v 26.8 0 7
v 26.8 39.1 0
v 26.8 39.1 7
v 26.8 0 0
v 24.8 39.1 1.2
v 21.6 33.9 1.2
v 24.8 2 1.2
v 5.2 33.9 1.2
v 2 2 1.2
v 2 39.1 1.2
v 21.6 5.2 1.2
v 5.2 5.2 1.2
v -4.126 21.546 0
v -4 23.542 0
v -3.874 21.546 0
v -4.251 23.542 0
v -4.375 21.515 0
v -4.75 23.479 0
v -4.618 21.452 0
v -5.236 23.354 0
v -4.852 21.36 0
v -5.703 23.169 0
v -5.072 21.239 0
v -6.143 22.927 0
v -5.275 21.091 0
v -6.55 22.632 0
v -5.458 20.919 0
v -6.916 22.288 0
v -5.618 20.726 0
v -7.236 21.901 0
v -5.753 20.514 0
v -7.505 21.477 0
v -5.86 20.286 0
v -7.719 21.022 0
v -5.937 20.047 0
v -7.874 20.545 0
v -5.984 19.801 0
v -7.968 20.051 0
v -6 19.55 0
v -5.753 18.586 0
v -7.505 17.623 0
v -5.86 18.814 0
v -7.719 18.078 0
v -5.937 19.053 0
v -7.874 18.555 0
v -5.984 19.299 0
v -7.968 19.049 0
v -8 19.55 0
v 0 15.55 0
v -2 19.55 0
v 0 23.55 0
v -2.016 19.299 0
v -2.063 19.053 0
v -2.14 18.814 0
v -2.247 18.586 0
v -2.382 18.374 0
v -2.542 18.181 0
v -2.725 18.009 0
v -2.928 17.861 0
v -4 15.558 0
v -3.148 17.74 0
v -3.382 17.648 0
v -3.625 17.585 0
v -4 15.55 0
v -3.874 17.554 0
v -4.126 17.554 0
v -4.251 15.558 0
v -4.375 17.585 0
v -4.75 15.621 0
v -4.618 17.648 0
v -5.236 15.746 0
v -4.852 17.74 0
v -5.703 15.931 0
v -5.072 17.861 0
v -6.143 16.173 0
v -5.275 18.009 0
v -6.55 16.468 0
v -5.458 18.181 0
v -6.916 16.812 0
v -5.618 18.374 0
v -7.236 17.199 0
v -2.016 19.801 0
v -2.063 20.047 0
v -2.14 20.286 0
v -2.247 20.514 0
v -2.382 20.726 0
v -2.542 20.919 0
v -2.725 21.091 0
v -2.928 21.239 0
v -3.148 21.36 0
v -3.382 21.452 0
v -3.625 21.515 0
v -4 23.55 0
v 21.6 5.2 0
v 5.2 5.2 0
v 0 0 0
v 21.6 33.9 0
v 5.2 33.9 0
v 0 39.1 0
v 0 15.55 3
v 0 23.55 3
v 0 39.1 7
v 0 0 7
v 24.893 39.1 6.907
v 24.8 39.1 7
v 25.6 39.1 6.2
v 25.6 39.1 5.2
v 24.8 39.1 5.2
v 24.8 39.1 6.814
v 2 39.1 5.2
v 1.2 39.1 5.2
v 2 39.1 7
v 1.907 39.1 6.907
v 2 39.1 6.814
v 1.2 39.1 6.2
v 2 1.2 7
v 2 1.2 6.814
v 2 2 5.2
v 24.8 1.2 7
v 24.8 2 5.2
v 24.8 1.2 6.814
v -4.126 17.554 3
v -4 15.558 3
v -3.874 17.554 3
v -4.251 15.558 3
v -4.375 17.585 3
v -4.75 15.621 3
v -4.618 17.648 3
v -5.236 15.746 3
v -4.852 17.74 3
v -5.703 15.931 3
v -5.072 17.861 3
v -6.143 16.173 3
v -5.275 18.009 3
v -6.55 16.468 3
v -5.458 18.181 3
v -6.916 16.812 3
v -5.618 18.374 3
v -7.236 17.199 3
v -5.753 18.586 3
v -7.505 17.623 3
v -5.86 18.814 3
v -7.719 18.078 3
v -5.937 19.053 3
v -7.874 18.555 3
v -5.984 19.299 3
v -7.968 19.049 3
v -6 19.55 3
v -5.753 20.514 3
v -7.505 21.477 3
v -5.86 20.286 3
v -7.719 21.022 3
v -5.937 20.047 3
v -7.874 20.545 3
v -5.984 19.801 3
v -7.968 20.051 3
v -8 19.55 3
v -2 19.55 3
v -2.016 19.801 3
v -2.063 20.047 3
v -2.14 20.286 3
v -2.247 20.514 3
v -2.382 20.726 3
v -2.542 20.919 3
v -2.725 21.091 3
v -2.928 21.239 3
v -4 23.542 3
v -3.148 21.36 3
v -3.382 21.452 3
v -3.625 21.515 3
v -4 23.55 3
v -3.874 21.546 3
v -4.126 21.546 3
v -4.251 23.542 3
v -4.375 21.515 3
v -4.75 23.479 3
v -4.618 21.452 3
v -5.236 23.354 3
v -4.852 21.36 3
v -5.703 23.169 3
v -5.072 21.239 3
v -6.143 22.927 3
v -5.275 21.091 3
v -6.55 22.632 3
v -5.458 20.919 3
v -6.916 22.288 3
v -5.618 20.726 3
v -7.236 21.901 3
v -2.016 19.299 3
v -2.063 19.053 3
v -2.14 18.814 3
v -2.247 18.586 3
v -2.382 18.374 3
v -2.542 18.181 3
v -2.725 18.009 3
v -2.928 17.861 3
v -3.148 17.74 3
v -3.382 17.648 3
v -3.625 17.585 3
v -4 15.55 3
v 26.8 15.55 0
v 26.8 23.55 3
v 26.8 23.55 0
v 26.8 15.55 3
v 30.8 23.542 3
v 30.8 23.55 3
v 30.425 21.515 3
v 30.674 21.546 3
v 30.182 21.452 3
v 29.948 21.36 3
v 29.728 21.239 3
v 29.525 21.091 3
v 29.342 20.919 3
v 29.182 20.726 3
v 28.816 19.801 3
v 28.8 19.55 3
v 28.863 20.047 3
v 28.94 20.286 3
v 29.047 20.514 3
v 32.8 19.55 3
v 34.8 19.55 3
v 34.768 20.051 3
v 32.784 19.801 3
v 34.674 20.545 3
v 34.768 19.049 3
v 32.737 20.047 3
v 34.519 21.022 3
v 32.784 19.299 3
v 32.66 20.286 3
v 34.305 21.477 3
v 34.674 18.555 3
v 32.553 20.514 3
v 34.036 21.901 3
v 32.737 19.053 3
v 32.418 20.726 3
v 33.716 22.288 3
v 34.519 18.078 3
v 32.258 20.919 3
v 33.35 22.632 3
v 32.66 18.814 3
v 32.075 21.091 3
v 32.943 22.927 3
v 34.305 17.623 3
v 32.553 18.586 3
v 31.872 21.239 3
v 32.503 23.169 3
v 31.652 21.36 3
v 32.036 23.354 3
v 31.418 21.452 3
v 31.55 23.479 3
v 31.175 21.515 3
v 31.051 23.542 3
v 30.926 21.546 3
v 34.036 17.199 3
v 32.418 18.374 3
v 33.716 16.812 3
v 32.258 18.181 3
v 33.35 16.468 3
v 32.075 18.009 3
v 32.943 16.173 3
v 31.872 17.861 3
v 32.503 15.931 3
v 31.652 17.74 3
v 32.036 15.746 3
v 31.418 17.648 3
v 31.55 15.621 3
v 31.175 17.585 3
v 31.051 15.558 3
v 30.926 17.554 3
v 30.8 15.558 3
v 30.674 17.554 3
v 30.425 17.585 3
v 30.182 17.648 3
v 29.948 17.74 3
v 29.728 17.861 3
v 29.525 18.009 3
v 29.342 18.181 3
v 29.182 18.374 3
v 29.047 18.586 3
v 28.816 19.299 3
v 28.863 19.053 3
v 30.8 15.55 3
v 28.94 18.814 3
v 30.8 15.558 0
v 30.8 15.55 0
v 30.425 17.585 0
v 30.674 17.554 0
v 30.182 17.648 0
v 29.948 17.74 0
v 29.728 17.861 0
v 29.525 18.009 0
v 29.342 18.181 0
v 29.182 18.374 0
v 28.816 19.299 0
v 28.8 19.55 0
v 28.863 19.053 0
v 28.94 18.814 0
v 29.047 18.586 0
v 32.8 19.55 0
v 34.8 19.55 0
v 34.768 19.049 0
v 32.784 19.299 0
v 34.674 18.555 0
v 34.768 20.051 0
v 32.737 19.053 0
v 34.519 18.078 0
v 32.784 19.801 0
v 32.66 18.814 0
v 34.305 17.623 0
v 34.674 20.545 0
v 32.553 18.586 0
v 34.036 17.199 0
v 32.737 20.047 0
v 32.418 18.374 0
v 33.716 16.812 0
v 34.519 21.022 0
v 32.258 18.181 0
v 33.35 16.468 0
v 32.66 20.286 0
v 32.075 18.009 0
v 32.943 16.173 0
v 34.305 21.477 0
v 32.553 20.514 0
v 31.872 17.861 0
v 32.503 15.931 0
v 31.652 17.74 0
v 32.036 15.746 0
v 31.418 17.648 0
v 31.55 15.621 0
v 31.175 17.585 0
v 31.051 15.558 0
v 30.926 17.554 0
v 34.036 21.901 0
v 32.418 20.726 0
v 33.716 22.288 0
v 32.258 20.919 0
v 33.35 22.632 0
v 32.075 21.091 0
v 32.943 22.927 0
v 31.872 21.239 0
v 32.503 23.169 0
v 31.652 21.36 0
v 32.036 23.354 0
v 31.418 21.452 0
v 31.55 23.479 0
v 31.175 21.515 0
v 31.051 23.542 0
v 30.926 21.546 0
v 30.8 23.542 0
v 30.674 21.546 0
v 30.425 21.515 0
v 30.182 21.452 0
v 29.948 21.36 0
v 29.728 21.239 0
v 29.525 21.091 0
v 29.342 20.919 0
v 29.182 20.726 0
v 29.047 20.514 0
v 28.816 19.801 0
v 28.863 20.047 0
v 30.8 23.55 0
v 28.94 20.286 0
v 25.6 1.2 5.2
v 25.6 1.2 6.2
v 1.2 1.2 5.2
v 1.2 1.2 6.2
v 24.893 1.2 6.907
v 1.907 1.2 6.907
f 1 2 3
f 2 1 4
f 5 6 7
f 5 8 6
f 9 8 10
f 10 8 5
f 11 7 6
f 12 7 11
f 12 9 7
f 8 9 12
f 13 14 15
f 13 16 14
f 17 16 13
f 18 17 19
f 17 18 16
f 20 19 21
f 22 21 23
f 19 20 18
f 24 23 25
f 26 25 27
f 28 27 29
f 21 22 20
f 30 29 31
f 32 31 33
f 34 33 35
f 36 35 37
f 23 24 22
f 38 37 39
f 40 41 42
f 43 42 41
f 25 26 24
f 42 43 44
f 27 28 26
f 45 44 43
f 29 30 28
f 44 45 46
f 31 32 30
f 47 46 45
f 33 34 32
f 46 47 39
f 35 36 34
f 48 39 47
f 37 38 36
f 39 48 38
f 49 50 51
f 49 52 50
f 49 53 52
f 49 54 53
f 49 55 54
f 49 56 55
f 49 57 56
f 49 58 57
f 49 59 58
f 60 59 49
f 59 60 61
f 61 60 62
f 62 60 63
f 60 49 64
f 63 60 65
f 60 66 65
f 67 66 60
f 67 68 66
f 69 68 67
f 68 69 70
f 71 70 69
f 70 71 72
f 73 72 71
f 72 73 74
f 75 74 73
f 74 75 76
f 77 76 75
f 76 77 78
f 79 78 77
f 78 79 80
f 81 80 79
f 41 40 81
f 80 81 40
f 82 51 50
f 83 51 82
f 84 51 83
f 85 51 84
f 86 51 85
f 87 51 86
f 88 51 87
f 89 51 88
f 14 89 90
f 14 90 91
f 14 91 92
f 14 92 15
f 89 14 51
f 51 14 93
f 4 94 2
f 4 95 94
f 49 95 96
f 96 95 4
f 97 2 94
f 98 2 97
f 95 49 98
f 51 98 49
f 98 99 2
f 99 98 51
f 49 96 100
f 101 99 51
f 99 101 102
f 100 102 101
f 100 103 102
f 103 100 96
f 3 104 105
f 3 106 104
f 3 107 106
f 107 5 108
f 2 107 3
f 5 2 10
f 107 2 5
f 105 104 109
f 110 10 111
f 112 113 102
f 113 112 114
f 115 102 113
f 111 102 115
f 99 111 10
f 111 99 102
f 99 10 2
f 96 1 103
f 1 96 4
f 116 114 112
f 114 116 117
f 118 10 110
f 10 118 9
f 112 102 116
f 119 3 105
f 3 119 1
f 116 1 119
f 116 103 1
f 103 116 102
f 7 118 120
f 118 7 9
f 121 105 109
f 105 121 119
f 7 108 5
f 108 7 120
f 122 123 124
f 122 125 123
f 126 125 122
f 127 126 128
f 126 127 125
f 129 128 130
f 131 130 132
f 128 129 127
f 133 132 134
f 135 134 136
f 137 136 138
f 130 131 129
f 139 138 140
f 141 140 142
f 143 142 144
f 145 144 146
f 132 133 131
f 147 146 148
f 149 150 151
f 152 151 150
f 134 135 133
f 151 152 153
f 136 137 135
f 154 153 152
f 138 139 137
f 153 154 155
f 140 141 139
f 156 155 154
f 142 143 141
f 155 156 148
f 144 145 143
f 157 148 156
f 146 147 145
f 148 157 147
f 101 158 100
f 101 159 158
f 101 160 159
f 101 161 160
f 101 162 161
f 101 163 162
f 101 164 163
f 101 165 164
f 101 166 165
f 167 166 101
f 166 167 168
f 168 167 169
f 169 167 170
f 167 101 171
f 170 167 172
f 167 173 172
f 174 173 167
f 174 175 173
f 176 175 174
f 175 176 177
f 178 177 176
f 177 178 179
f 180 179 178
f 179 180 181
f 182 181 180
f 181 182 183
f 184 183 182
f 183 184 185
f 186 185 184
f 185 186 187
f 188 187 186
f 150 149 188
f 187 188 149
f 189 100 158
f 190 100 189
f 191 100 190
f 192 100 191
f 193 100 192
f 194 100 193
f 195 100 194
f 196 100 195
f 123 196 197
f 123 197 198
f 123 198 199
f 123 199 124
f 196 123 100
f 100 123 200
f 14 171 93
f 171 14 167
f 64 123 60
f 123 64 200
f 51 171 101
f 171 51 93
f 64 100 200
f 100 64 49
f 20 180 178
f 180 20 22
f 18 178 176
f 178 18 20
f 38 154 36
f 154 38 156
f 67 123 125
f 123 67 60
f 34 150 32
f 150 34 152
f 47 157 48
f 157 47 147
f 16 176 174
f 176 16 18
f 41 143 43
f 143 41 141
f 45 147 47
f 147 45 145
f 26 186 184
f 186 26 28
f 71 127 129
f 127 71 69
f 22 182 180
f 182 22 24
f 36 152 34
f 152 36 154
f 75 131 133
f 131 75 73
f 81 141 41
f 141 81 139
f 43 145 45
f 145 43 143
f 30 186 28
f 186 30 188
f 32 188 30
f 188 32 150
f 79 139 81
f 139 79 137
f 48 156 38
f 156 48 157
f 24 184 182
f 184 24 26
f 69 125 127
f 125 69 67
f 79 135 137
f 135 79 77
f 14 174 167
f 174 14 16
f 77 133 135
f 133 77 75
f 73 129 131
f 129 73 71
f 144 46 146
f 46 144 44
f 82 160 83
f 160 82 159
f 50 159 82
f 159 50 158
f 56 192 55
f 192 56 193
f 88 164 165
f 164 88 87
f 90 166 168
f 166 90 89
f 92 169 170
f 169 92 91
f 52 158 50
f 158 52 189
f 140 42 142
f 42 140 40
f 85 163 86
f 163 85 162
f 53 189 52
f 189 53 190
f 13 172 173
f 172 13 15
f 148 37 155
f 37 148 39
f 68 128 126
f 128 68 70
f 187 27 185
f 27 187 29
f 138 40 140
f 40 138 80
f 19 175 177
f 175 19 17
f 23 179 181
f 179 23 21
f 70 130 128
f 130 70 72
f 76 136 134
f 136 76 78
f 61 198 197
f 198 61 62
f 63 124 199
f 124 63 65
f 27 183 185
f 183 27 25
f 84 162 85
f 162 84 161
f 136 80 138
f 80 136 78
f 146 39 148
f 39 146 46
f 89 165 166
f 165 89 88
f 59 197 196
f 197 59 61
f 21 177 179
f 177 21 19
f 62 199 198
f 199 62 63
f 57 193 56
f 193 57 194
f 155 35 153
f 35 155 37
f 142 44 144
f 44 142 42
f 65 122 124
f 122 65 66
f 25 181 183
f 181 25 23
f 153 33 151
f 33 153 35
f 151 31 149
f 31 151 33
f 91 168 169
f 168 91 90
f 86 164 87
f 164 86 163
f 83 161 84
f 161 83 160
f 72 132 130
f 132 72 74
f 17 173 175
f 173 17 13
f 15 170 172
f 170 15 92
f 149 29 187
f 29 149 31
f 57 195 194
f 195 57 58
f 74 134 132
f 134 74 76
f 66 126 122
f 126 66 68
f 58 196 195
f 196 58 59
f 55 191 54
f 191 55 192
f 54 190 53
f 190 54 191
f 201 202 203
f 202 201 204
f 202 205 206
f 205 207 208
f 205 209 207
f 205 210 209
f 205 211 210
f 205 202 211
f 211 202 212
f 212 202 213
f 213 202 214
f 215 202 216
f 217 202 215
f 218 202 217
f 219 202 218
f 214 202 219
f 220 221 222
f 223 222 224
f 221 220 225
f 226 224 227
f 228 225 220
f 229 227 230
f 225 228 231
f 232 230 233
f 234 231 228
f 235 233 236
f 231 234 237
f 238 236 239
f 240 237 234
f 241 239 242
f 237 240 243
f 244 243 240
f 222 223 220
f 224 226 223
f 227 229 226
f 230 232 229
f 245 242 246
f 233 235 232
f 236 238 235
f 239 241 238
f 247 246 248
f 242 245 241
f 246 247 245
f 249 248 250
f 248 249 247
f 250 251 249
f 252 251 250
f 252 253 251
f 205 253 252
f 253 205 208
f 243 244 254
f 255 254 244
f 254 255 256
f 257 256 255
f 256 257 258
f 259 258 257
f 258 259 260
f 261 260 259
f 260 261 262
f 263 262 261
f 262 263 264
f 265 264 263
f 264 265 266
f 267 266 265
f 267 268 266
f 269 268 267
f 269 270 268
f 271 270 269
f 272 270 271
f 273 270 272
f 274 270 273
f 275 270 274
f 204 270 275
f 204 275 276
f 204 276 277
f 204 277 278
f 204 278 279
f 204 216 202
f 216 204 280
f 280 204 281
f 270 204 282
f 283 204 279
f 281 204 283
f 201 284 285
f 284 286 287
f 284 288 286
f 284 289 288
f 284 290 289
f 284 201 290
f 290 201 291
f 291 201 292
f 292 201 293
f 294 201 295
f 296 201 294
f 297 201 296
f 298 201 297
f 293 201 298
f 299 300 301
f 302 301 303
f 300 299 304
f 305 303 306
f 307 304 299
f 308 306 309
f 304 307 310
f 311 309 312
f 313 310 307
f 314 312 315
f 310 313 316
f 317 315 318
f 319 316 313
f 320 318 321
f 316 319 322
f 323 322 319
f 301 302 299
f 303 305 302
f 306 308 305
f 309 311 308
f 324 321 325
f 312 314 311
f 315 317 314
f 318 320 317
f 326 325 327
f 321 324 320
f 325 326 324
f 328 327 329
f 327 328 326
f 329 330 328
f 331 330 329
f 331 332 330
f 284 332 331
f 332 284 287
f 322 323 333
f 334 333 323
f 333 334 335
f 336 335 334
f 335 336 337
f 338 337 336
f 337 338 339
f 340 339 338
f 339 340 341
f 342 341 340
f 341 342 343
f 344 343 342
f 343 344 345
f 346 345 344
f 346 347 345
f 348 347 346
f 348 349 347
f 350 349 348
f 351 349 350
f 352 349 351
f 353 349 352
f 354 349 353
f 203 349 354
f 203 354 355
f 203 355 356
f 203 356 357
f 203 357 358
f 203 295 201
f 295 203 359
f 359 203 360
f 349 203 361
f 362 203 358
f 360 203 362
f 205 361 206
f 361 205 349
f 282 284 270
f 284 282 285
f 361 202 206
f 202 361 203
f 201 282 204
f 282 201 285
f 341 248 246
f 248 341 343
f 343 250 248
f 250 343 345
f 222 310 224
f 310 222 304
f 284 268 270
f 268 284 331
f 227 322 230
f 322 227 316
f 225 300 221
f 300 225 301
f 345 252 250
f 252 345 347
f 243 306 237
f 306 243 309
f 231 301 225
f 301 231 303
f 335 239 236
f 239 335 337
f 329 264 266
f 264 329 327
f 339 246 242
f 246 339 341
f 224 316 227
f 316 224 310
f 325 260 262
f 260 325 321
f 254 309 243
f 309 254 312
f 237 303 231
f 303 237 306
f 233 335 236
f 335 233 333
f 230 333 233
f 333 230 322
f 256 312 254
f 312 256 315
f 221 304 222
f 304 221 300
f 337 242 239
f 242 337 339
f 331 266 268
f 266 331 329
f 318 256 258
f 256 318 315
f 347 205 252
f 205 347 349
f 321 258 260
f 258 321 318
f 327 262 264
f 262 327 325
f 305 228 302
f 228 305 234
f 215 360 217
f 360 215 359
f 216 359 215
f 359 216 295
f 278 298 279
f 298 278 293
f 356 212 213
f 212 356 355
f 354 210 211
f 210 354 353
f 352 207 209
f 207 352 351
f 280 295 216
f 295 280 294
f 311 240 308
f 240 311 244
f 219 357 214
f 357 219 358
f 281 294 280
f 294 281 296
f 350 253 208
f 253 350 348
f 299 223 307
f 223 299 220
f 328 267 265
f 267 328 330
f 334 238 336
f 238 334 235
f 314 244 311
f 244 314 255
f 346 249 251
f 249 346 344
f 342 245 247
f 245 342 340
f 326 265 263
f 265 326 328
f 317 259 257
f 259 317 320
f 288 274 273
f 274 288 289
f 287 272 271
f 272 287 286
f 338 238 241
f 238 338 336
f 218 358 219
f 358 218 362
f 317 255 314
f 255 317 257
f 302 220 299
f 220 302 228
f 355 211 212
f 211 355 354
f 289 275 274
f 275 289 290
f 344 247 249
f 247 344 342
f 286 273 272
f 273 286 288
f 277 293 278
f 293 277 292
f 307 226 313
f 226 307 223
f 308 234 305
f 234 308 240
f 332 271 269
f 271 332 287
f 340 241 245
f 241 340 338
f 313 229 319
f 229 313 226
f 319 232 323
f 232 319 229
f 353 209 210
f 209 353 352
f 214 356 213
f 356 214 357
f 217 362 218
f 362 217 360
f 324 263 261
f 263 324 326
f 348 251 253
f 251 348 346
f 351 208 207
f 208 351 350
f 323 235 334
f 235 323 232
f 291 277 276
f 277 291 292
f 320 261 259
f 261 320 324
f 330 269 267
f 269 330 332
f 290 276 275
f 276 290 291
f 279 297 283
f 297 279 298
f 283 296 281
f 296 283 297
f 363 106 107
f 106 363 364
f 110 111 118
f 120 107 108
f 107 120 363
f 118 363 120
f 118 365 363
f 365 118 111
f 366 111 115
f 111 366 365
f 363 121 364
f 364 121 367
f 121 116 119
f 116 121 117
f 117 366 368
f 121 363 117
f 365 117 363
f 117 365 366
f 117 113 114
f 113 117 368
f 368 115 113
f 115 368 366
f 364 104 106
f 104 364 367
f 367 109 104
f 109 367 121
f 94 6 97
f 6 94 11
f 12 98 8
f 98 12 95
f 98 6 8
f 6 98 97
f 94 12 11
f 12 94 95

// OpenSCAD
// file: ../lib/pcb_led_cvf.scad
// for led power module modified

/* bluetooth_mate_holder.scad
 * By John Biehler - November 17, 2011
 * http://www.thingiverse.com/thing:

 * derived from pcb_box_slide_with_tabs.scad
 * By Nicholas C Lewis - Jan 1, 2011
 * http://www.thingiverse.com/thing:5396
 *
 * derived from pcb_box_slide.scad
 *     Parametric, open PCB-box (slide-in) by chlunde
 *     http://www.thingiverse.com/thing:4071
 *
 * CHANGES
 * - adjusted to fit Arduino Mega
 * - added mounting tabs
 * - turned off cutouts
 * - adjusted bottom cutout size
 */

$fn=50;

module pcb_led_cvf(

	pcb_width = 48.2,
	pcb_length =24.1,
	pcb_height =1.1,
	slisse = 0.8,

	pcb_bottom_margin = 1,
	wall_width_thick = 2,
	box_height = 7,

	//tab parameters
	tab_hole_radius=2,
	tab_outer_radius=4,

	inner_margin = 4,

	add_tabs = true

) {
	wall_width = wall_width_thick-slisse;

module tab() {
	difference(){
		union() {
			translate([-tab_outer_radius,-tab_outer_radius,0])
			cube([tab_outer_radius,2*tab_outer_radius,wall_width_thick+1]);
			translate([-tab_outer_radius,0,0])
				cylinder(r=tab_outer_radius, h = wall_width_thick+1);
		}
		translate([-tab_outer_radius,0,0]) {
			cylinder(r= tab_hole_radius, h = wall_width_thick+5,center=true);
		}
	}

}

module box() {
	union() {
		cube([pcb_width + 2*wall_width, pcb_length + 2*wall_width, wall_width]);

		cube([wall_width_thick, pcb_length + 2*wall_width, box_height]);

		cube([pcb_width + 2*wall_width, wall_width_thick, box_height]);

		%translate([0, pcb_length+wall_width, 0])
			cube([pcb_width + 2*wall_width,wall_width,box_height]);

		translate([pcb_width + wall_width - slisse,0,0])
			cube([wall_width_thick, pcb_length + 2*wall_width, box_height]);
	}
	if(add_tabs) {
//comment out this part to remove tabs
		for(i=[(pcb_length + 2*wall_width)/2]){
	translate([0,i,0])tab();
	translate([pcb_width + 2*wall_width,i,0])mirror()tab();
		}
	}

}

module pcb() {
	translate([wall_width, wall_width, wall_width + pcb_bottom_margin])
		cube([pcb_width,pcb_length + wall_width + 0.1,pcb_height]);
	translate([wall_width, wall_width, wall_width + pcb_bottom_margin+pcb_height])rotate([0,45,0])
		cube([pcb_height,pcb_length + wall_width + 0.1,pcb_height]);
	translate([wall_width+pcb_width-2*cos(45)*pcb_height, wall_width, wall_width + pcb_bottom_margin+pcb_height])rotate([0,45,0])
		cube([pcb_height,pcb_length + wall_width + 0.1,pcb_height]);
	translate([wall_width_thick, wall_width, wall_width + pcb_bottom_margin])
		cube([pcb_width-2*slisse,pcb_length + wall_width + 0.1,box_height]);

}



module holes() {
		*translate([wall_width + pcb_width/2, wall_width_thick + 0.1, pcb_width/2+wall_width])
			rotate(a=90,v=[1,0,0])
				cylinder(r=pcb_width/2, h=wall_width_thick + 0.2);

		*translate([-0.1, wall_width + pcb_length/2, pcb_length/2 + wall_width])
			rotate(a=90,v=[0,1,0])
				cylinder(r=pcb_length/2, h=wall_width_thick + 0.2);

		*translate([pcb_width + wall_width - slisse - 0.1, wall_width + pcb_length/2, pcb_length/2 + wall_width])
			rotate(a=90,v=[0,1,0])
				cylinder(r=pcb_length/2, h=wall_width_thick + 0.2);

	 * translate([pcb_width/2 + wall_width, wall_width + pcb_length/2, -0.1])
			rotate(a=0,v=[0,1,0])
				cylinder(r=min(pcb_length,pcb_width)/2 - wall_width/2, h=wall_width_thick + 0.2);

		translate([inner_margin +wall_width, inner_margin+wall_width, -0.1])
			cube([pcb_width-inner_margin*2,pcb_length -inner_margin*2,wall_width + 0.2]);
}

	difference() {
		box();
		pcb();
		holes();
	}
}



pcb_led_cvf();
// main file
use <../lib/pcb_led_cvf.scad>


pcb_led_cvf(
  pcb_length=36.7,
  pcb_width=24.4,
  pcb_height=1,
  pcb_bottom_margin=4
);
